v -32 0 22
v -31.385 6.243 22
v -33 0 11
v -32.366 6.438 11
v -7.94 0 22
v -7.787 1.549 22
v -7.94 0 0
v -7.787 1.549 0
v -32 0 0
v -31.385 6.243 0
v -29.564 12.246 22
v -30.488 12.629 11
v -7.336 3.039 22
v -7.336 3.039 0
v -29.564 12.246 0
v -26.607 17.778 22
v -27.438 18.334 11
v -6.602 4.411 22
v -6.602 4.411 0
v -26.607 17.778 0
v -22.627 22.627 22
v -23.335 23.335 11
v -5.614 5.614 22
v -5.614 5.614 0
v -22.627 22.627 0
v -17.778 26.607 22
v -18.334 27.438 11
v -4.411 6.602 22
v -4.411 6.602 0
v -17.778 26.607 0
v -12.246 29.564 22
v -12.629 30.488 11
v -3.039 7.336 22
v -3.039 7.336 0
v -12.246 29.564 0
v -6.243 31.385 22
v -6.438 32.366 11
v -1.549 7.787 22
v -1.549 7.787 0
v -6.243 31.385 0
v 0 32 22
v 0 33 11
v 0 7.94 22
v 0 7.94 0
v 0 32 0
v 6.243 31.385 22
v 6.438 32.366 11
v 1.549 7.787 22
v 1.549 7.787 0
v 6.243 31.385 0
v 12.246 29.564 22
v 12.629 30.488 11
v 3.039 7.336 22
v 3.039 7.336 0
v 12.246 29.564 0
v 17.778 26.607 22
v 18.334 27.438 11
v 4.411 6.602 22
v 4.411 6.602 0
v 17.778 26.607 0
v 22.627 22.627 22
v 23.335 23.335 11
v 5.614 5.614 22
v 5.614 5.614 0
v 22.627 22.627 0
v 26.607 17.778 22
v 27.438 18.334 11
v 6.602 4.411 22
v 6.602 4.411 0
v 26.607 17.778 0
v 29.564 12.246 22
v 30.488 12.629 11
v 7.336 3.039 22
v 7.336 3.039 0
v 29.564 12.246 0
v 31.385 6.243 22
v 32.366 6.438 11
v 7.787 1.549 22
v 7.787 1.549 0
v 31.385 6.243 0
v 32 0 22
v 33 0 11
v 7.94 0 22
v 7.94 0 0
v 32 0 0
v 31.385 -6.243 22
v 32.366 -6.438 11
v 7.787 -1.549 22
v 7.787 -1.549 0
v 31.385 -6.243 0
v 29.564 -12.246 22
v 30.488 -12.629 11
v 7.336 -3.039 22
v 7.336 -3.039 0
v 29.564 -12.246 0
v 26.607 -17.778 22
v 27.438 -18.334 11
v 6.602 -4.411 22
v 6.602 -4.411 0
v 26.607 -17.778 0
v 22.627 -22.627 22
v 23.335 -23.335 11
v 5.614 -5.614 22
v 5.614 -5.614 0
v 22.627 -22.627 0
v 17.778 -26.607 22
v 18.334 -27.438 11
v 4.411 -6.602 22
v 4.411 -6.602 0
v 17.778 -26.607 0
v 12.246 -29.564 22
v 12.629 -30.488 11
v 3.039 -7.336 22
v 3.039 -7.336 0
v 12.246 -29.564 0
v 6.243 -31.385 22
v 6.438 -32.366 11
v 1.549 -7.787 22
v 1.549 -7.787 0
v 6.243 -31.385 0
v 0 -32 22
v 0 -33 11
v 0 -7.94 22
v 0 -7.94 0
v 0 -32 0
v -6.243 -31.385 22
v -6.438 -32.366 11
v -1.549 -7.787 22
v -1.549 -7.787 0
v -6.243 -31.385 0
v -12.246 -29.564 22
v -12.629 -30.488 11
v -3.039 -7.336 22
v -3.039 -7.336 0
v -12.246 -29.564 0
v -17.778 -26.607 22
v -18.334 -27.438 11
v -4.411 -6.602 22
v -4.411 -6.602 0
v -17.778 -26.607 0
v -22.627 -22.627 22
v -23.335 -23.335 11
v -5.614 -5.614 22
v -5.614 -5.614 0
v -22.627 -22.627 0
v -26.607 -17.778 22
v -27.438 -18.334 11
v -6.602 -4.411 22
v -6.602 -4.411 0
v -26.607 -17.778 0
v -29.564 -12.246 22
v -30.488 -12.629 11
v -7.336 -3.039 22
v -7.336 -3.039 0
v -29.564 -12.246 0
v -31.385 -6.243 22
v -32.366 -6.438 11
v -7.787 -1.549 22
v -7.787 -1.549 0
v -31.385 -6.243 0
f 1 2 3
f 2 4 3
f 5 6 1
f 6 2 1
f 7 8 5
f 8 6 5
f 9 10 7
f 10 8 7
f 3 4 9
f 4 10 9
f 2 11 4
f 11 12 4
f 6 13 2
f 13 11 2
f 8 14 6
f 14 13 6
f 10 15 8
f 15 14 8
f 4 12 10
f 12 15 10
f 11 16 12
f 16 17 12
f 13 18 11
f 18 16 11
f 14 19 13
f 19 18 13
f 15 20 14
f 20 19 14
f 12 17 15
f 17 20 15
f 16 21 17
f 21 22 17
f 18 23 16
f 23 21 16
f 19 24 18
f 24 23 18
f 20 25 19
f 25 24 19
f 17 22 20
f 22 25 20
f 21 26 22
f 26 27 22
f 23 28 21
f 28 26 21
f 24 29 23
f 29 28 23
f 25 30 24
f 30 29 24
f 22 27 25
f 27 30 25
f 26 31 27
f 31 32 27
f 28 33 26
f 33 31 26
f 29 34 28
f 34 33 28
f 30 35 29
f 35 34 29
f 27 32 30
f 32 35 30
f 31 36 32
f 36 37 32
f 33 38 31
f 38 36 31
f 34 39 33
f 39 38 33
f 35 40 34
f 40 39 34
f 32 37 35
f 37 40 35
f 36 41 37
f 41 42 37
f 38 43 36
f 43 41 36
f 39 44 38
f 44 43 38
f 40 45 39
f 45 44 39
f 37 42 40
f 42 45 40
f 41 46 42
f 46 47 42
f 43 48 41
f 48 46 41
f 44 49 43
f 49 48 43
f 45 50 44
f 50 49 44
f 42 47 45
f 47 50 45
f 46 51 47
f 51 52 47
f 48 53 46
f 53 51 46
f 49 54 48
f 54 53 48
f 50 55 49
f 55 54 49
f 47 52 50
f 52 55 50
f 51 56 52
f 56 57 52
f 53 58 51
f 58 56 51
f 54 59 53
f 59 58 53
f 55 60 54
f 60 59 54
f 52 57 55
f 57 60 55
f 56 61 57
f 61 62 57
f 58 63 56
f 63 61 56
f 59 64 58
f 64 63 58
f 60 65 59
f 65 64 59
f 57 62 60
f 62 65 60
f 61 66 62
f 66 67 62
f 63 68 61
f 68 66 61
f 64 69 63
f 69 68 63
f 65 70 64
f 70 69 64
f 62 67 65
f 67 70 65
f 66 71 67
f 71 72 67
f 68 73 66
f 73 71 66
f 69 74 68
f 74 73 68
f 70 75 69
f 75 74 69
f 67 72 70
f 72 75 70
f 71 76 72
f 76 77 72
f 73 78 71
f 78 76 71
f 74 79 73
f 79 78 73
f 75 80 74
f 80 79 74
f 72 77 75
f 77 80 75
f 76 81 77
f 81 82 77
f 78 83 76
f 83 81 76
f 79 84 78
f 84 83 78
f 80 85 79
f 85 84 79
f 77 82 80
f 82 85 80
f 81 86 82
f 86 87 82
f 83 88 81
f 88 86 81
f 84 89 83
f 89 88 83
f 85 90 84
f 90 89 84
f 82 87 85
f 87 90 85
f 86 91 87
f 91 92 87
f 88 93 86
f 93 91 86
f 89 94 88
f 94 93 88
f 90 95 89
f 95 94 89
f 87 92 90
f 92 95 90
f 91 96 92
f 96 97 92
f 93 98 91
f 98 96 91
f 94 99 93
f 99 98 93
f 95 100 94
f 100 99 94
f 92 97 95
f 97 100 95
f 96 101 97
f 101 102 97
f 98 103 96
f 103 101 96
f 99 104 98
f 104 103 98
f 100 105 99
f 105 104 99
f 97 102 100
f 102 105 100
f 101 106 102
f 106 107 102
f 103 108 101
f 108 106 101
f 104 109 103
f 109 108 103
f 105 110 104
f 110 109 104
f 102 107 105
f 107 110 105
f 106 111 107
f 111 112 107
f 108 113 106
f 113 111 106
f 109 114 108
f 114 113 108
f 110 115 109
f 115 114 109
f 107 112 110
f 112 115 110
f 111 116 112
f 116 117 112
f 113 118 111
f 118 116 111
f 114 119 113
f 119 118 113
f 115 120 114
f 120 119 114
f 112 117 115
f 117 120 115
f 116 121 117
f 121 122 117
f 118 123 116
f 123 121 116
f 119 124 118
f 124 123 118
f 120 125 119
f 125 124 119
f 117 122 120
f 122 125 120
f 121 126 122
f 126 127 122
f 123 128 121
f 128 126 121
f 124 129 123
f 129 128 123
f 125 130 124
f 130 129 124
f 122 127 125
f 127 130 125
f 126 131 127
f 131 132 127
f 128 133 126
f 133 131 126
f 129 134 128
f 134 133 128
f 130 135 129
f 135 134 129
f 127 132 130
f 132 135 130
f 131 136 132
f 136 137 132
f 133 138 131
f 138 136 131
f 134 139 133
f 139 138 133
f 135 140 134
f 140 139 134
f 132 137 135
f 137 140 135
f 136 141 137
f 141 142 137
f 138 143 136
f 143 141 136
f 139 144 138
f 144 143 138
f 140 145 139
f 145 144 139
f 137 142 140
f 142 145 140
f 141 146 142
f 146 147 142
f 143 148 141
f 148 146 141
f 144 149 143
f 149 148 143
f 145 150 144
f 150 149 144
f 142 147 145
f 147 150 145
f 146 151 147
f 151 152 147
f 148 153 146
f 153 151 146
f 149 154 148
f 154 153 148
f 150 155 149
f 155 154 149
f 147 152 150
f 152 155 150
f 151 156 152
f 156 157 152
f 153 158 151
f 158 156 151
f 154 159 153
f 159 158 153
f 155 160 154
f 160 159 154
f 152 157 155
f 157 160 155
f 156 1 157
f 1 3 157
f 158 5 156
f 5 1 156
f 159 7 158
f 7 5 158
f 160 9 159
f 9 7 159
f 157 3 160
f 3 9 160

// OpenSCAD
$fn = 32;

// ----------------------------------------------------------------------
// Belt roller: 64 mm barrel, 22 mm wide, bore 15.88 mm
// ----------------------------------------------------------------------

// --- parameters (mm) ---
bore_d = 15.88;           // bore
barrel_d = 64;            // barrel diameter
roller_w = 22;            // roller width
crown = 1;                // crown height at mid width

roller_profile = [[7.94, 0], [32, 0], [33, 11], [32, 22], [7.94, 22]];

/* the profile stays clear of the axis, so the bore comes out of the revolve */
rotate_extrude() polygon(roller_profile);
